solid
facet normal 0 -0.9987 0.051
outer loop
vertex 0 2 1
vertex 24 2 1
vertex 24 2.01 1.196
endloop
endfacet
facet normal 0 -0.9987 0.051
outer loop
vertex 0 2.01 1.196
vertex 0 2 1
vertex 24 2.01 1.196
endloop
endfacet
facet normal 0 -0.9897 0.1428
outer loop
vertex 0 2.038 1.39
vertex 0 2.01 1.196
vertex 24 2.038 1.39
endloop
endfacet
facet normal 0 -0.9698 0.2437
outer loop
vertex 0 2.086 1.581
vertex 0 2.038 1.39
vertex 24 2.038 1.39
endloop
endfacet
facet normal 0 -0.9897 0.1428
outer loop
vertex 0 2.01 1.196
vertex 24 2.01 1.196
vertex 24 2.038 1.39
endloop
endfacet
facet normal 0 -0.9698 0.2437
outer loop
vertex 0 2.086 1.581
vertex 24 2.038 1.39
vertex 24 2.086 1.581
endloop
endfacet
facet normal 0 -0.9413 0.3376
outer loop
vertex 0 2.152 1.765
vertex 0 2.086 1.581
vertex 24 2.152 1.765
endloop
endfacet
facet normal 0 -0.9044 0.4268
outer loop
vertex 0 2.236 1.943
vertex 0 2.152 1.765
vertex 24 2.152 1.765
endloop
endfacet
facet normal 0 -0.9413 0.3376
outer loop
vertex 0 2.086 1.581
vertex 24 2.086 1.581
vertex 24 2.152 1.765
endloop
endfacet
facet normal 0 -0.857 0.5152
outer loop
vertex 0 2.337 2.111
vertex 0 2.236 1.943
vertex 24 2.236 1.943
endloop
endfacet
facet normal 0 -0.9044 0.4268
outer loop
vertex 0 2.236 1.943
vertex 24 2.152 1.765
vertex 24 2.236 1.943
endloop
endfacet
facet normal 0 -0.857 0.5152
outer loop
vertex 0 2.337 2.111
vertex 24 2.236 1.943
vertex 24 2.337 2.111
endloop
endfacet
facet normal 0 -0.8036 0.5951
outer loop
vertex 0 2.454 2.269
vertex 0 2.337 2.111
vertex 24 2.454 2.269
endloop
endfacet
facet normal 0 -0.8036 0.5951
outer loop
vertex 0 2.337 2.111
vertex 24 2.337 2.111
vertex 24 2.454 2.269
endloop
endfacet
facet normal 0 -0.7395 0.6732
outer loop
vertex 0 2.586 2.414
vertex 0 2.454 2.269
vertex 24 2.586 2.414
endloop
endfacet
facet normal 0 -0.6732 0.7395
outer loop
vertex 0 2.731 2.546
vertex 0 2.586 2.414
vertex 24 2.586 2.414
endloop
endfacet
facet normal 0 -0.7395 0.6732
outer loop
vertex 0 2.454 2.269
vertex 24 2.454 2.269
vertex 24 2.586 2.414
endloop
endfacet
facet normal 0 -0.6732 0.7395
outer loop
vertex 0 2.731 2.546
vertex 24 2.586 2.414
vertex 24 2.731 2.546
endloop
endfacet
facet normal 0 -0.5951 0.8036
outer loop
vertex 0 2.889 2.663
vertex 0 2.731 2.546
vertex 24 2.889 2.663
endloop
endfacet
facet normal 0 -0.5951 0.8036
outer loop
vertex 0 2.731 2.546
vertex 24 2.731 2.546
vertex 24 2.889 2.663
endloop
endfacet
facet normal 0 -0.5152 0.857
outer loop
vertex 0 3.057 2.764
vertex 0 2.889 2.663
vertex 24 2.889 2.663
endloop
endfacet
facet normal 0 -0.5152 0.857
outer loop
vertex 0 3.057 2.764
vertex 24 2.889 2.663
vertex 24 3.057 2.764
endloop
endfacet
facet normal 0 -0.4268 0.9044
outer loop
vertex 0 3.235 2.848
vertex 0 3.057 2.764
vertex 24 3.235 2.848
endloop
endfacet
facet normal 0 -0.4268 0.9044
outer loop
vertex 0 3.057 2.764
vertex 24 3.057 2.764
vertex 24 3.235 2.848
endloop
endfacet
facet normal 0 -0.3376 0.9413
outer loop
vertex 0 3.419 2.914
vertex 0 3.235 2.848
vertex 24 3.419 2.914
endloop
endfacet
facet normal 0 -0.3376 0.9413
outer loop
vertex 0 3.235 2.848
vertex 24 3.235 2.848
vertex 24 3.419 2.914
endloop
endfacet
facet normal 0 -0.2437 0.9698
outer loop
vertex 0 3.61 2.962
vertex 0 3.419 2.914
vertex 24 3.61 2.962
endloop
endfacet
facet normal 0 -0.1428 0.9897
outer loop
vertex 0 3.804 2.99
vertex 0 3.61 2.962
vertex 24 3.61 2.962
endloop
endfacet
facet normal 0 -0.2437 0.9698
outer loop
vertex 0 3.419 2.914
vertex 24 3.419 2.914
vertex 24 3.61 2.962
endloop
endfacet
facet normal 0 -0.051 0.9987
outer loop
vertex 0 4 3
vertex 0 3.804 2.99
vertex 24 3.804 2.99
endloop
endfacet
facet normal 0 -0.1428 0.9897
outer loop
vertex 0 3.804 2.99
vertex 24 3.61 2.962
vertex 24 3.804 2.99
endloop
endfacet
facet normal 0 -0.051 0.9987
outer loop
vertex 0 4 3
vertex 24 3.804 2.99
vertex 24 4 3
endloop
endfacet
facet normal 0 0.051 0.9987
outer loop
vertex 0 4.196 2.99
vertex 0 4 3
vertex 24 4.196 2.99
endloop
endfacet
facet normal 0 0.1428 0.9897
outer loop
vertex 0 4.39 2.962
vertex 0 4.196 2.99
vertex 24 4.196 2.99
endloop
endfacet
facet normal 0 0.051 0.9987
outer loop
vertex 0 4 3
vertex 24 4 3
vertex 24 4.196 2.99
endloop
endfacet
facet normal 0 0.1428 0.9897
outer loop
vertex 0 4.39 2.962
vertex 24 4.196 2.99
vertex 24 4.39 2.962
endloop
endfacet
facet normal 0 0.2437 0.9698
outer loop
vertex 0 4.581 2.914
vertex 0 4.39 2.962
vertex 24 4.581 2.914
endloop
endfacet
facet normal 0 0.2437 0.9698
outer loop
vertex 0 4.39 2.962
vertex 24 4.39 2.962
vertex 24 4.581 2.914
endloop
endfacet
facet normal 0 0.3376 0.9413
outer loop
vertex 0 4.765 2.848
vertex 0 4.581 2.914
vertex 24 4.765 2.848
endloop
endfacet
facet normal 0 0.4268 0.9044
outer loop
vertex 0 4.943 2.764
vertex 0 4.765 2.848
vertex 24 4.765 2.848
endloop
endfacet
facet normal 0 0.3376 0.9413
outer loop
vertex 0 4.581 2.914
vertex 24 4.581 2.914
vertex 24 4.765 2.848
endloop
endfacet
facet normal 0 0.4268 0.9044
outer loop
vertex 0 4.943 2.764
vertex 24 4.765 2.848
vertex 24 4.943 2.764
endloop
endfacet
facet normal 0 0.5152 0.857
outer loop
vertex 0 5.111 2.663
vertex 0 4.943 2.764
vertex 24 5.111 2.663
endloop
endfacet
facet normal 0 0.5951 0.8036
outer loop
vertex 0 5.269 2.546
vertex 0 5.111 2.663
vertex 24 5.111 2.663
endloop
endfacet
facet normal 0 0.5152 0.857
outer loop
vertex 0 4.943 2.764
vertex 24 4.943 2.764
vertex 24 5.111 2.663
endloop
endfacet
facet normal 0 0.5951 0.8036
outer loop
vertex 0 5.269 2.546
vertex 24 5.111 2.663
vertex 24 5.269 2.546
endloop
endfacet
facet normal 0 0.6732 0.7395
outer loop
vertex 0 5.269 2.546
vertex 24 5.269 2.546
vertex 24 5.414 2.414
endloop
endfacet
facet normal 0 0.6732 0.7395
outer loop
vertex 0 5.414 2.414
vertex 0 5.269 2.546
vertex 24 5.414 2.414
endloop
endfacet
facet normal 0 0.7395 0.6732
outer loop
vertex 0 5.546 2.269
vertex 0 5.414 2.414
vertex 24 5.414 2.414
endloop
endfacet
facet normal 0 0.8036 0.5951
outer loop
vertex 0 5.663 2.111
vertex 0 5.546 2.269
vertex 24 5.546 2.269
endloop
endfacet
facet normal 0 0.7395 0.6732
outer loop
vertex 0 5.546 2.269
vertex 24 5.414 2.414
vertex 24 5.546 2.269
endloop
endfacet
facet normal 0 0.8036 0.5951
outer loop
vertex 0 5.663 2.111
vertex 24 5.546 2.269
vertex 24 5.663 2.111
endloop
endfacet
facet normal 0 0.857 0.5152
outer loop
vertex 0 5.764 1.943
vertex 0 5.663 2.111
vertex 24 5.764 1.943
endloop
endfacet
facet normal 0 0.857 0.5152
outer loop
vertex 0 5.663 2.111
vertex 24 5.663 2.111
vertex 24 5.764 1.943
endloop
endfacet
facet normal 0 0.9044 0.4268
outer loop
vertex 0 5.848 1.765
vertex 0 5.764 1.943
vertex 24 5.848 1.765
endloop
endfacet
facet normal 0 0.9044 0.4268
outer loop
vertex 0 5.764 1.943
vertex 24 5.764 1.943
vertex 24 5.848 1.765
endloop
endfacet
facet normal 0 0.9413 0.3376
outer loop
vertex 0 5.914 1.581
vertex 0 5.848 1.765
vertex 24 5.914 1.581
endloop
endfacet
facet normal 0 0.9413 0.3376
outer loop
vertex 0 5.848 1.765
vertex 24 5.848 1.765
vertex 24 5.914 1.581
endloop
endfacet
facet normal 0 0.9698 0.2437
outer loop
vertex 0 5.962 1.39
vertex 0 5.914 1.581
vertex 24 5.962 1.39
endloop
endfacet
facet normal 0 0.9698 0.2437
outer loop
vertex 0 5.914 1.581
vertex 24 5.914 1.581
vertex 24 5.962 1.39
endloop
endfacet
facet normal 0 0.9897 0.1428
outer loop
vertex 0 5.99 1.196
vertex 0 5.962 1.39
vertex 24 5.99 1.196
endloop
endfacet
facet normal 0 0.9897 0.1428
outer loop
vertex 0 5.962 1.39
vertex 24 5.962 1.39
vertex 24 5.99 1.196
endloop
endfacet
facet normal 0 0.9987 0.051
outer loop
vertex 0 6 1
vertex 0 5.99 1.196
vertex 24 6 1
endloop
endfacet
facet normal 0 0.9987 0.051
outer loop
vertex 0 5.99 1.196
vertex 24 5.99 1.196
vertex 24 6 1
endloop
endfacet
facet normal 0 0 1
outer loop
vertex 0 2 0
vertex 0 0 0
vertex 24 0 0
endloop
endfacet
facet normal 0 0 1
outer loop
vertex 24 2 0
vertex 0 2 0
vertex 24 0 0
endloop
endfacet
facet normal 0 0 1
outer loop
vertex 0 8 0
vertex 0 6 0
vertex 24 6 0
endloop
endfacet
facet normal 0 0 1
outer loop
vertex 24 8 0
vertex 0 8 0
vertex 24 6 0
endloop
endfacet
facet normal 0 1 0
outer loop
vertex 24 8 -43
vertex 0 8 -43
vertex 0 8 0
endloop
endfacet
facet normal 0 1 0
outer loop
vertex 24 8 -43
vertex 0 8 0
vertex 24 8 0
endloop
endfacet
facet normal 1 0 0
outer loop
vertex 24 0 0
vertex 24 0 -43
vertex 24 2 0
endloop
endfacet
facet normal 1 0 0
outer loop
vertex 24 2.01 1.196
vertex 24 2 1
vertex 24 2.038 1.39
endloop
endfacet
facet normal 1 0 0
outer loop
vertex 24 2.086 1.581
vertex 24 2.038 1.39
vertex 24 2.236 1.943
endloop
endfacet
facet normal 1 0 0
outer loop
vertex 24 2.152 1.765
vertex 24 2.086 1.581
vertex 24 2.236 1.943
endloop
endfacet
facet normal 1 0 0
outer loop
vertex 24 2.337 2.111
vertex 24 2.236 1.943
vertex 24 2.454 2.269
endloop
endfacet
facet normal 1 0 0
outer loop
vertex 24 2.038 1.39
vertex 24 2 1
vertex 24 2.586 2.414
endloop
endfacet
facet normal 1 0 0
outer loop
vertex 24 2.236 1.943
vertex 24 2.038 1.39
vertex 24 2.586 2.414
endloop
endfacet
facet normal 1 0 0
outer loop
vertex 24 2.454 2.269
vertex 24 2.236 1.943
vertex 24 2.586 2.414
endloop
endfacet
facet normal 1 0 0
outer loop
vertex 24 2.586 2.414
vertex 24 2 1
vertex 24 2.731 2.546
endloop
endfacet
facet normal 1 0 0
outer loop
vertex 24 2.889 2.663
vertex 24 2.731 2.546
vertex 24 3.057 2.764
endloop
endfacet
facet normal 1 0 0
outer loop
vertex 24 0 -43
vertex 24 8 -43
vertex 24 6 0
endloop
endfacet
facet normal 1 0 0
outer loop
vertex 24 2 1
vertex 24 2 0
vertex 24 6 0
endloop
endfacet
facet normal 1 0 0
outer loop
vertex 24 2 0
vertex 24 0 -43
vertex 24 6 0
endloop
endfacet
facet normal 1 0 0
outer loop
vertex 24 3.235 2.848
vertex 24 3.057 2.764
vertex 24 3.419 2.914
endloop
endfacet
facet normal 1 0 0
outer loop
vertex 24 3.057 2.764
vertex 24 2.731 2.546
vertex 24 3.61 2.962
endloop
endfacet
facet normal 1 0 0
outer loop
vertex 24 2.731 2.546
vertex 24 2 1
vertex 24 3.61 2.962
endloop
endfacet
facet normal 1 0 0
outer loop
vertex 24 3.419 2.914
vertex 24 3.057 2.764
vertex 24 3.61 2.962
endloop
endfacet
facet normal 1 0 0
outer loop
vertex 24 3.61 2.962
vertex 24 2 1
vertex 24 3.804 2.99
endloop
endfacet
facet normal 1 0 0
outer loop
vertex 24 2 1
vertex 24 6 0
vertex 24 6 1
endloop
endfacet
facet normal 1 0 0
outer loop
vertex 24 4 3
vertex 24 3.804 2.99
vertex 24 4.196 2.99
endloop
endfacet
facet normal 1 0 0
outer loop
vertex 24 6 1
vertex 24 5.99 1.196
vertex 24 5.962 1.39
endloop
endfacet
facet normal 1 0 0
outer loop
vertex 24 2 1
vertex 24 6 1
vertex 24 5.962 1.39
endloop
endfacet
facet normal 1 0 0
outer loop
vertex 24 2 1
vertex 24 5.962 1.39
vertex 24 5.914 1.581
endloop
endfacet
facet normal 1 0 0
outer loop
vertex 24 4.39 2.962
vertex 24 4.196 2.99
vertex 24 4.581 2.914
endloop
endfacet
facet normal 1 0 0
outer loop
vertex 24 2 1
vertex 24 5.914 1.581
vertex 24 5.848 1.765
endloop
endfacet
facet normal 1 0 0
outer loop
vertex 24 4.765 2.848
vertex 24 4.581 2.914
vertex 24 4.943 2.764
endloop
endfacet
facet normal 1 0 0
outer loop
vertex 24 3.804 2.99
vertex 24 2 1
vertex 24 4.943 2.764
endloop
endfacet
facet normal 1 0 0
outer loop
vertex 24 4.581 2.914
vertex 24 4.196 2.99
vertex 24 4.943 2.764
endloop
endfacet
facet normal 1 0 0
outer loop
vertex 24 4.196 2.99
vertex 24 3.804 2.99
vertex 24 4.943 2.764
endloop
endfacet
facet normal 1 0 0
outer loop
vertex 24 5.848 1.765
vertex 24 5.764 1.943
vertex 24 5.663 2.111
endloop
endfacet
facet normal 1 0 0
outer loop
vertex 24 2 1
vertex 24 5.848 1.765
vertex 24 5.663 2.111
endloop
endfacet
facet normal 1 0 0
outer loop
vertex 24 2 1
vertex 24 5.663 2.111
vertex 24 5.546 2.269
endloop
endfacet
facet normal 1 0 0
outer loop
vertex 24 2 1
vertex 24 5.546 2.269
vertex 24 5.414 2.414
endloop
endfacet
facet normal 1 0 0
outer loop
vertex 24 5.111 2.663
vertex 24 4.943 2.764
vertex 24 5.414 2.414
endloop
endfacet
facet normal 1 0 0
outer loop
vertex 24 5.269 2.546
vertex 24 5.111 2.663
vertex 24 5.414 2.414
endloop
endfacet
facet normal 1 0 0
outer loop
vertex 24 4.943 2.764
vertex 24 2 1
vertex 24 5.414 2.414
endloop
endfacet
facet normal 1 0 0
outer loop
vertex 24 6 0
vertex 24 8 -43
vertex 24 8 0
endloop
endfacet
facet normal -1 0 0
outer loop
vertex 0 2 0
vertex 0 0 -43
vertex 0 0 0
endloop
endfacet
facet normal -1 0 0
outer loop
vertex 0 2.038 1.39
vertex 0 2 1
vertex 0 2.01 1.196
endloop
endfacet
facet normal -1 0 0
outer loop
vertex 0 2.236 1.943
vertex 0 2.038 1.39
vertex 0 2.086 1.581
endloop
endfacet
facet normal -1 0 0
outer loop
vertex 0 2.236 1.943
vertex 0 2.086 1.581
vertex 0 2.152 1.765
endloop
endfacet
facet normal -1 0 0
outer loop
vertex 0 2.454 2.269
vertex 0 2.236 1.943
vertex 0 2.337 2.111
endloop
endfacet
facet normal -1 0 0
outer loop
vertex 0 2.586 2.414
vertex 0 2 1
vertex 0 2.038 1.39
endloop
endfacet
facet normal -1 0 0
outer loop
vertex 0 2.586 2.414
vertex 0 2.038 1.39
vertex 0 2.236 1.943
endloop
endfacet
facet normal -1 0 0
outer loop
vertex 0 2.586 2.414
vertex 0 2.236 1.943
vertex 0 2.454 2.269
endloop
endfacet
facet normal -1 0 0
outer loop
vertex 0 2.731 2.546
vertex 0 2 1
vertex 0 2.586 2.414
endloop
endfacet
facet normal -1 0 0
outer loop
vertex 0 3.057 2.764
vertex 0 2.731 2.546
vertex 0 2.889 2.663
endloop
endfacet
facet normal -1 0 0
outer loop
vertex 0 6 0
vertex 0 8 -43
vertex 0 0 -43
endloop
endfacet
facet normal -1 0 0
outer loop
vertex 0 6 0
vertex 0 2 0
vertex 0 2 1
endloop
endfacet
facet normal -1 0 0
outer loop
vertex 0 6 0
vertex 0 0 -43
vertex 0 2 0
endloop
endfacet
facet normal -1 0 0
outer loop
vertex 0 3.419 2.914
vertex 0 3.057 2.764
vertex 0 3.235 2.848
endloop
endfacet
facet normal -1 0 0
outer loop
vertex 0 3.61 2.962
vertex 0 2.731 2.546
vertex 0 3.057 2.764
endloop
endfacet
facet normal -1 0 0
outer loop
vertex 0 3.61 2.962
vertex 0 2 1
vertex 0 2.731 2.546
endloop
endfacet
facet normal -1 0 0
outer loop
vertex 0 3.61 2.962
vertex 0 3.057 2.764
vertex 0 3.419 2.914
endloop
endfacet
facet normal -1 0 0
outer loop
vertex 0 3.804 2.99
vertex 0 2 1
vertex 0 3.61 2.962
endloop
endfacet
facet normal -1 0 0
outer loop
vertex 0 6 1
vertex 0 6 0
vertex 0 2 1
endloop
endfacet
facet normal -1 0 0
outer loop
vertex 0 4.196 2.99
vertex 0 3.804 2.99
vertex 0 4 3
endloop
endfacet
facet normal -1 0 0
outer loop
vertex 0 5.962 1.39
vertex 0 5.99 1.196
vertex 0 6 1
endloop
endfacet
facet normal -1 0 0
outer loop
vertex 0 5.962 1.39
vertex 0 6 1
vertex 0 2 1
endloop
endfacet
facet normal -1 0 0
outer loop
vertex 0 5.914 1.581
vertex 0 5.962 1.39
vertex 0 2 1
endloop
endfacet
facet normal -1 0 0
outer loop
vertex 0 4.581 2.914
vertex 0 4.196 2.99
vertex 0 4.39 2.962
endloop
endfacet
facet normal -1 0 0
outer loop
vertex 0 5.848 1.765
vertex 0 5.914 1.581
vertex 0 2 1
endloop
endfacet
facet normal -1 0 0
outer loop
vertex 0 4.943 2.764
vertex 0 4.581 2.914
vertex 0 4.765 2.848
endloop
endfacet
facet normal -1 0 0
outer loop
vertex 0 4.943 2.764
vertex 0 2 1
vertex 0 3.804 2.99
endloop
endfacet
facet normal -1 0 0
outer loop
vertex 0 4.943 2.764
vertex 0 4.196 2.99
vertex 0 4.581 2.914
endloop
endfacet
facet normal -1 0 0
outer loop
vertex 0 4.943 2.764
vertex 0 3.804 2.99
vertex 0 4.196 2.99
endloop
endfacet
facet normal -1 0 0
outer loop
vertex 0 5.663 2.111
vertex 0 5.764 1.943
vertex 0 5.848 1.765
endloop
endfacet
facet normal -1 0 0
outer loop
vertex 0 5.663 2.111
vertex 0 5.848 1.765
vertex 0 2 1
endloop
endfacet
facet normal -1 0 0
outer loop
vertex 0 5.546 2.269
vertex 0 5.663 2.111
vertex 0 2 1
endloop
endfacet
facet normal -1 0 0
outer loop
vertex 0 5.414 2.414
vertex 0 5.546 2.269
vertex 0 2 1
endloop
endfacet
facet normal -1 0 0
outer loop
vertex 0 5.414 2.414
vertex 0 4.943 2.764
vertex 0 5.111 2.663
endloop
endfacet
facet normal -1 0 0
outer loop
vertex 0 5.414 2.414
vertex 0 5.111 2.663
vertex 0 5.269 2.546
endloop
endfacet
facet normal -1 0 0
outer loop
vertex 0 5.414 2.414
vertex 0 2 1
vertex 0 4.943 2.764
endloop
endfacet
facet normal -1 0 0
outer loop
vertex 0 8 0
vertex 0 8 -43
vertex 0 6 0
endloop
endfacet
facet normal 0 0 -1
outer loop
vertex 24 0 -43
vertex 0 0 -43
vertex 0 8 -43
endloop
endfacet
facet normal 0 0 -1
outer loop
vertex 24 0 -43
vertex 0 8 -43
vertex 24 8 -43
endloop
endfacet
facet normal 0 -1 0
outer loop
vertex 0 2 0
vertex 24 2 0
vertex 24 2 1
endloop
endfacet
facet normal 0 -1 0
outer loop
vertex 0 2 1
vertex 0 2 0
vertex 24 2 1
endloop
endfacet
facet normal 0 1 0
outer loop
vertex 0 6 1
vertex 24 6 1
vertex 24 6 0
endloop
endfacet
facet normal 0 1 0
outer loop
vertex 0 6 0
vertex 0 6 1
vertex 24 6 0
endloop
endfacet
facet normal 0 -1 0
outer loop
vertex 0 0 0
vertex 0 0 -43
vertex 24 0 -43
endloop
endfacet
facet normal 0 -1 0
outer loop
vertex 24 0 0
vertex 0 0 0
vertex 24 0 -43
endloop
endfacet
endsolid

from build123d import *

# Parameters (mm, degrees)
SKETCH_1_W      = 24
SKETCH_1_H      = 43
EXTRUDE_1_DEPTH = 8
EXTRUDE_2_DEPTH = 24


with BuildPart() as part:
    # 草图1 → 凸台-拉伸1 (new body)
    with BuildSketch(Plane(origin=(0, 0, 0), x_dir=(1, 0, 0), z_dir=(0, 1, 0))):
        with Locations((12, 21.5)):
            Rectangle(SKETCH_1_W, SKETCH_1_H)
    extrude(amount=EXTRUDE_1_DEPTH)

    # 草图2 → 凸台-拉伸2 (add)
    with BuildSketch(Plane(origin=(24, 0, 0), x_dir=(0, 0, -1), z_dir=(1, 0, 0))):
        with BuildLine():
            Line((0, 2), (-1, 2))
            ThreePointArc((-1, 2), (-3, 4), (-1, 6))
            Line((-1, 6), (0, 6))
            ThreePointArc((0, 6), (2, 4), (0, 2))
        make_face()
    extrude(amount=-EXTRUDE_2_DEPTH)


solid = part.part
